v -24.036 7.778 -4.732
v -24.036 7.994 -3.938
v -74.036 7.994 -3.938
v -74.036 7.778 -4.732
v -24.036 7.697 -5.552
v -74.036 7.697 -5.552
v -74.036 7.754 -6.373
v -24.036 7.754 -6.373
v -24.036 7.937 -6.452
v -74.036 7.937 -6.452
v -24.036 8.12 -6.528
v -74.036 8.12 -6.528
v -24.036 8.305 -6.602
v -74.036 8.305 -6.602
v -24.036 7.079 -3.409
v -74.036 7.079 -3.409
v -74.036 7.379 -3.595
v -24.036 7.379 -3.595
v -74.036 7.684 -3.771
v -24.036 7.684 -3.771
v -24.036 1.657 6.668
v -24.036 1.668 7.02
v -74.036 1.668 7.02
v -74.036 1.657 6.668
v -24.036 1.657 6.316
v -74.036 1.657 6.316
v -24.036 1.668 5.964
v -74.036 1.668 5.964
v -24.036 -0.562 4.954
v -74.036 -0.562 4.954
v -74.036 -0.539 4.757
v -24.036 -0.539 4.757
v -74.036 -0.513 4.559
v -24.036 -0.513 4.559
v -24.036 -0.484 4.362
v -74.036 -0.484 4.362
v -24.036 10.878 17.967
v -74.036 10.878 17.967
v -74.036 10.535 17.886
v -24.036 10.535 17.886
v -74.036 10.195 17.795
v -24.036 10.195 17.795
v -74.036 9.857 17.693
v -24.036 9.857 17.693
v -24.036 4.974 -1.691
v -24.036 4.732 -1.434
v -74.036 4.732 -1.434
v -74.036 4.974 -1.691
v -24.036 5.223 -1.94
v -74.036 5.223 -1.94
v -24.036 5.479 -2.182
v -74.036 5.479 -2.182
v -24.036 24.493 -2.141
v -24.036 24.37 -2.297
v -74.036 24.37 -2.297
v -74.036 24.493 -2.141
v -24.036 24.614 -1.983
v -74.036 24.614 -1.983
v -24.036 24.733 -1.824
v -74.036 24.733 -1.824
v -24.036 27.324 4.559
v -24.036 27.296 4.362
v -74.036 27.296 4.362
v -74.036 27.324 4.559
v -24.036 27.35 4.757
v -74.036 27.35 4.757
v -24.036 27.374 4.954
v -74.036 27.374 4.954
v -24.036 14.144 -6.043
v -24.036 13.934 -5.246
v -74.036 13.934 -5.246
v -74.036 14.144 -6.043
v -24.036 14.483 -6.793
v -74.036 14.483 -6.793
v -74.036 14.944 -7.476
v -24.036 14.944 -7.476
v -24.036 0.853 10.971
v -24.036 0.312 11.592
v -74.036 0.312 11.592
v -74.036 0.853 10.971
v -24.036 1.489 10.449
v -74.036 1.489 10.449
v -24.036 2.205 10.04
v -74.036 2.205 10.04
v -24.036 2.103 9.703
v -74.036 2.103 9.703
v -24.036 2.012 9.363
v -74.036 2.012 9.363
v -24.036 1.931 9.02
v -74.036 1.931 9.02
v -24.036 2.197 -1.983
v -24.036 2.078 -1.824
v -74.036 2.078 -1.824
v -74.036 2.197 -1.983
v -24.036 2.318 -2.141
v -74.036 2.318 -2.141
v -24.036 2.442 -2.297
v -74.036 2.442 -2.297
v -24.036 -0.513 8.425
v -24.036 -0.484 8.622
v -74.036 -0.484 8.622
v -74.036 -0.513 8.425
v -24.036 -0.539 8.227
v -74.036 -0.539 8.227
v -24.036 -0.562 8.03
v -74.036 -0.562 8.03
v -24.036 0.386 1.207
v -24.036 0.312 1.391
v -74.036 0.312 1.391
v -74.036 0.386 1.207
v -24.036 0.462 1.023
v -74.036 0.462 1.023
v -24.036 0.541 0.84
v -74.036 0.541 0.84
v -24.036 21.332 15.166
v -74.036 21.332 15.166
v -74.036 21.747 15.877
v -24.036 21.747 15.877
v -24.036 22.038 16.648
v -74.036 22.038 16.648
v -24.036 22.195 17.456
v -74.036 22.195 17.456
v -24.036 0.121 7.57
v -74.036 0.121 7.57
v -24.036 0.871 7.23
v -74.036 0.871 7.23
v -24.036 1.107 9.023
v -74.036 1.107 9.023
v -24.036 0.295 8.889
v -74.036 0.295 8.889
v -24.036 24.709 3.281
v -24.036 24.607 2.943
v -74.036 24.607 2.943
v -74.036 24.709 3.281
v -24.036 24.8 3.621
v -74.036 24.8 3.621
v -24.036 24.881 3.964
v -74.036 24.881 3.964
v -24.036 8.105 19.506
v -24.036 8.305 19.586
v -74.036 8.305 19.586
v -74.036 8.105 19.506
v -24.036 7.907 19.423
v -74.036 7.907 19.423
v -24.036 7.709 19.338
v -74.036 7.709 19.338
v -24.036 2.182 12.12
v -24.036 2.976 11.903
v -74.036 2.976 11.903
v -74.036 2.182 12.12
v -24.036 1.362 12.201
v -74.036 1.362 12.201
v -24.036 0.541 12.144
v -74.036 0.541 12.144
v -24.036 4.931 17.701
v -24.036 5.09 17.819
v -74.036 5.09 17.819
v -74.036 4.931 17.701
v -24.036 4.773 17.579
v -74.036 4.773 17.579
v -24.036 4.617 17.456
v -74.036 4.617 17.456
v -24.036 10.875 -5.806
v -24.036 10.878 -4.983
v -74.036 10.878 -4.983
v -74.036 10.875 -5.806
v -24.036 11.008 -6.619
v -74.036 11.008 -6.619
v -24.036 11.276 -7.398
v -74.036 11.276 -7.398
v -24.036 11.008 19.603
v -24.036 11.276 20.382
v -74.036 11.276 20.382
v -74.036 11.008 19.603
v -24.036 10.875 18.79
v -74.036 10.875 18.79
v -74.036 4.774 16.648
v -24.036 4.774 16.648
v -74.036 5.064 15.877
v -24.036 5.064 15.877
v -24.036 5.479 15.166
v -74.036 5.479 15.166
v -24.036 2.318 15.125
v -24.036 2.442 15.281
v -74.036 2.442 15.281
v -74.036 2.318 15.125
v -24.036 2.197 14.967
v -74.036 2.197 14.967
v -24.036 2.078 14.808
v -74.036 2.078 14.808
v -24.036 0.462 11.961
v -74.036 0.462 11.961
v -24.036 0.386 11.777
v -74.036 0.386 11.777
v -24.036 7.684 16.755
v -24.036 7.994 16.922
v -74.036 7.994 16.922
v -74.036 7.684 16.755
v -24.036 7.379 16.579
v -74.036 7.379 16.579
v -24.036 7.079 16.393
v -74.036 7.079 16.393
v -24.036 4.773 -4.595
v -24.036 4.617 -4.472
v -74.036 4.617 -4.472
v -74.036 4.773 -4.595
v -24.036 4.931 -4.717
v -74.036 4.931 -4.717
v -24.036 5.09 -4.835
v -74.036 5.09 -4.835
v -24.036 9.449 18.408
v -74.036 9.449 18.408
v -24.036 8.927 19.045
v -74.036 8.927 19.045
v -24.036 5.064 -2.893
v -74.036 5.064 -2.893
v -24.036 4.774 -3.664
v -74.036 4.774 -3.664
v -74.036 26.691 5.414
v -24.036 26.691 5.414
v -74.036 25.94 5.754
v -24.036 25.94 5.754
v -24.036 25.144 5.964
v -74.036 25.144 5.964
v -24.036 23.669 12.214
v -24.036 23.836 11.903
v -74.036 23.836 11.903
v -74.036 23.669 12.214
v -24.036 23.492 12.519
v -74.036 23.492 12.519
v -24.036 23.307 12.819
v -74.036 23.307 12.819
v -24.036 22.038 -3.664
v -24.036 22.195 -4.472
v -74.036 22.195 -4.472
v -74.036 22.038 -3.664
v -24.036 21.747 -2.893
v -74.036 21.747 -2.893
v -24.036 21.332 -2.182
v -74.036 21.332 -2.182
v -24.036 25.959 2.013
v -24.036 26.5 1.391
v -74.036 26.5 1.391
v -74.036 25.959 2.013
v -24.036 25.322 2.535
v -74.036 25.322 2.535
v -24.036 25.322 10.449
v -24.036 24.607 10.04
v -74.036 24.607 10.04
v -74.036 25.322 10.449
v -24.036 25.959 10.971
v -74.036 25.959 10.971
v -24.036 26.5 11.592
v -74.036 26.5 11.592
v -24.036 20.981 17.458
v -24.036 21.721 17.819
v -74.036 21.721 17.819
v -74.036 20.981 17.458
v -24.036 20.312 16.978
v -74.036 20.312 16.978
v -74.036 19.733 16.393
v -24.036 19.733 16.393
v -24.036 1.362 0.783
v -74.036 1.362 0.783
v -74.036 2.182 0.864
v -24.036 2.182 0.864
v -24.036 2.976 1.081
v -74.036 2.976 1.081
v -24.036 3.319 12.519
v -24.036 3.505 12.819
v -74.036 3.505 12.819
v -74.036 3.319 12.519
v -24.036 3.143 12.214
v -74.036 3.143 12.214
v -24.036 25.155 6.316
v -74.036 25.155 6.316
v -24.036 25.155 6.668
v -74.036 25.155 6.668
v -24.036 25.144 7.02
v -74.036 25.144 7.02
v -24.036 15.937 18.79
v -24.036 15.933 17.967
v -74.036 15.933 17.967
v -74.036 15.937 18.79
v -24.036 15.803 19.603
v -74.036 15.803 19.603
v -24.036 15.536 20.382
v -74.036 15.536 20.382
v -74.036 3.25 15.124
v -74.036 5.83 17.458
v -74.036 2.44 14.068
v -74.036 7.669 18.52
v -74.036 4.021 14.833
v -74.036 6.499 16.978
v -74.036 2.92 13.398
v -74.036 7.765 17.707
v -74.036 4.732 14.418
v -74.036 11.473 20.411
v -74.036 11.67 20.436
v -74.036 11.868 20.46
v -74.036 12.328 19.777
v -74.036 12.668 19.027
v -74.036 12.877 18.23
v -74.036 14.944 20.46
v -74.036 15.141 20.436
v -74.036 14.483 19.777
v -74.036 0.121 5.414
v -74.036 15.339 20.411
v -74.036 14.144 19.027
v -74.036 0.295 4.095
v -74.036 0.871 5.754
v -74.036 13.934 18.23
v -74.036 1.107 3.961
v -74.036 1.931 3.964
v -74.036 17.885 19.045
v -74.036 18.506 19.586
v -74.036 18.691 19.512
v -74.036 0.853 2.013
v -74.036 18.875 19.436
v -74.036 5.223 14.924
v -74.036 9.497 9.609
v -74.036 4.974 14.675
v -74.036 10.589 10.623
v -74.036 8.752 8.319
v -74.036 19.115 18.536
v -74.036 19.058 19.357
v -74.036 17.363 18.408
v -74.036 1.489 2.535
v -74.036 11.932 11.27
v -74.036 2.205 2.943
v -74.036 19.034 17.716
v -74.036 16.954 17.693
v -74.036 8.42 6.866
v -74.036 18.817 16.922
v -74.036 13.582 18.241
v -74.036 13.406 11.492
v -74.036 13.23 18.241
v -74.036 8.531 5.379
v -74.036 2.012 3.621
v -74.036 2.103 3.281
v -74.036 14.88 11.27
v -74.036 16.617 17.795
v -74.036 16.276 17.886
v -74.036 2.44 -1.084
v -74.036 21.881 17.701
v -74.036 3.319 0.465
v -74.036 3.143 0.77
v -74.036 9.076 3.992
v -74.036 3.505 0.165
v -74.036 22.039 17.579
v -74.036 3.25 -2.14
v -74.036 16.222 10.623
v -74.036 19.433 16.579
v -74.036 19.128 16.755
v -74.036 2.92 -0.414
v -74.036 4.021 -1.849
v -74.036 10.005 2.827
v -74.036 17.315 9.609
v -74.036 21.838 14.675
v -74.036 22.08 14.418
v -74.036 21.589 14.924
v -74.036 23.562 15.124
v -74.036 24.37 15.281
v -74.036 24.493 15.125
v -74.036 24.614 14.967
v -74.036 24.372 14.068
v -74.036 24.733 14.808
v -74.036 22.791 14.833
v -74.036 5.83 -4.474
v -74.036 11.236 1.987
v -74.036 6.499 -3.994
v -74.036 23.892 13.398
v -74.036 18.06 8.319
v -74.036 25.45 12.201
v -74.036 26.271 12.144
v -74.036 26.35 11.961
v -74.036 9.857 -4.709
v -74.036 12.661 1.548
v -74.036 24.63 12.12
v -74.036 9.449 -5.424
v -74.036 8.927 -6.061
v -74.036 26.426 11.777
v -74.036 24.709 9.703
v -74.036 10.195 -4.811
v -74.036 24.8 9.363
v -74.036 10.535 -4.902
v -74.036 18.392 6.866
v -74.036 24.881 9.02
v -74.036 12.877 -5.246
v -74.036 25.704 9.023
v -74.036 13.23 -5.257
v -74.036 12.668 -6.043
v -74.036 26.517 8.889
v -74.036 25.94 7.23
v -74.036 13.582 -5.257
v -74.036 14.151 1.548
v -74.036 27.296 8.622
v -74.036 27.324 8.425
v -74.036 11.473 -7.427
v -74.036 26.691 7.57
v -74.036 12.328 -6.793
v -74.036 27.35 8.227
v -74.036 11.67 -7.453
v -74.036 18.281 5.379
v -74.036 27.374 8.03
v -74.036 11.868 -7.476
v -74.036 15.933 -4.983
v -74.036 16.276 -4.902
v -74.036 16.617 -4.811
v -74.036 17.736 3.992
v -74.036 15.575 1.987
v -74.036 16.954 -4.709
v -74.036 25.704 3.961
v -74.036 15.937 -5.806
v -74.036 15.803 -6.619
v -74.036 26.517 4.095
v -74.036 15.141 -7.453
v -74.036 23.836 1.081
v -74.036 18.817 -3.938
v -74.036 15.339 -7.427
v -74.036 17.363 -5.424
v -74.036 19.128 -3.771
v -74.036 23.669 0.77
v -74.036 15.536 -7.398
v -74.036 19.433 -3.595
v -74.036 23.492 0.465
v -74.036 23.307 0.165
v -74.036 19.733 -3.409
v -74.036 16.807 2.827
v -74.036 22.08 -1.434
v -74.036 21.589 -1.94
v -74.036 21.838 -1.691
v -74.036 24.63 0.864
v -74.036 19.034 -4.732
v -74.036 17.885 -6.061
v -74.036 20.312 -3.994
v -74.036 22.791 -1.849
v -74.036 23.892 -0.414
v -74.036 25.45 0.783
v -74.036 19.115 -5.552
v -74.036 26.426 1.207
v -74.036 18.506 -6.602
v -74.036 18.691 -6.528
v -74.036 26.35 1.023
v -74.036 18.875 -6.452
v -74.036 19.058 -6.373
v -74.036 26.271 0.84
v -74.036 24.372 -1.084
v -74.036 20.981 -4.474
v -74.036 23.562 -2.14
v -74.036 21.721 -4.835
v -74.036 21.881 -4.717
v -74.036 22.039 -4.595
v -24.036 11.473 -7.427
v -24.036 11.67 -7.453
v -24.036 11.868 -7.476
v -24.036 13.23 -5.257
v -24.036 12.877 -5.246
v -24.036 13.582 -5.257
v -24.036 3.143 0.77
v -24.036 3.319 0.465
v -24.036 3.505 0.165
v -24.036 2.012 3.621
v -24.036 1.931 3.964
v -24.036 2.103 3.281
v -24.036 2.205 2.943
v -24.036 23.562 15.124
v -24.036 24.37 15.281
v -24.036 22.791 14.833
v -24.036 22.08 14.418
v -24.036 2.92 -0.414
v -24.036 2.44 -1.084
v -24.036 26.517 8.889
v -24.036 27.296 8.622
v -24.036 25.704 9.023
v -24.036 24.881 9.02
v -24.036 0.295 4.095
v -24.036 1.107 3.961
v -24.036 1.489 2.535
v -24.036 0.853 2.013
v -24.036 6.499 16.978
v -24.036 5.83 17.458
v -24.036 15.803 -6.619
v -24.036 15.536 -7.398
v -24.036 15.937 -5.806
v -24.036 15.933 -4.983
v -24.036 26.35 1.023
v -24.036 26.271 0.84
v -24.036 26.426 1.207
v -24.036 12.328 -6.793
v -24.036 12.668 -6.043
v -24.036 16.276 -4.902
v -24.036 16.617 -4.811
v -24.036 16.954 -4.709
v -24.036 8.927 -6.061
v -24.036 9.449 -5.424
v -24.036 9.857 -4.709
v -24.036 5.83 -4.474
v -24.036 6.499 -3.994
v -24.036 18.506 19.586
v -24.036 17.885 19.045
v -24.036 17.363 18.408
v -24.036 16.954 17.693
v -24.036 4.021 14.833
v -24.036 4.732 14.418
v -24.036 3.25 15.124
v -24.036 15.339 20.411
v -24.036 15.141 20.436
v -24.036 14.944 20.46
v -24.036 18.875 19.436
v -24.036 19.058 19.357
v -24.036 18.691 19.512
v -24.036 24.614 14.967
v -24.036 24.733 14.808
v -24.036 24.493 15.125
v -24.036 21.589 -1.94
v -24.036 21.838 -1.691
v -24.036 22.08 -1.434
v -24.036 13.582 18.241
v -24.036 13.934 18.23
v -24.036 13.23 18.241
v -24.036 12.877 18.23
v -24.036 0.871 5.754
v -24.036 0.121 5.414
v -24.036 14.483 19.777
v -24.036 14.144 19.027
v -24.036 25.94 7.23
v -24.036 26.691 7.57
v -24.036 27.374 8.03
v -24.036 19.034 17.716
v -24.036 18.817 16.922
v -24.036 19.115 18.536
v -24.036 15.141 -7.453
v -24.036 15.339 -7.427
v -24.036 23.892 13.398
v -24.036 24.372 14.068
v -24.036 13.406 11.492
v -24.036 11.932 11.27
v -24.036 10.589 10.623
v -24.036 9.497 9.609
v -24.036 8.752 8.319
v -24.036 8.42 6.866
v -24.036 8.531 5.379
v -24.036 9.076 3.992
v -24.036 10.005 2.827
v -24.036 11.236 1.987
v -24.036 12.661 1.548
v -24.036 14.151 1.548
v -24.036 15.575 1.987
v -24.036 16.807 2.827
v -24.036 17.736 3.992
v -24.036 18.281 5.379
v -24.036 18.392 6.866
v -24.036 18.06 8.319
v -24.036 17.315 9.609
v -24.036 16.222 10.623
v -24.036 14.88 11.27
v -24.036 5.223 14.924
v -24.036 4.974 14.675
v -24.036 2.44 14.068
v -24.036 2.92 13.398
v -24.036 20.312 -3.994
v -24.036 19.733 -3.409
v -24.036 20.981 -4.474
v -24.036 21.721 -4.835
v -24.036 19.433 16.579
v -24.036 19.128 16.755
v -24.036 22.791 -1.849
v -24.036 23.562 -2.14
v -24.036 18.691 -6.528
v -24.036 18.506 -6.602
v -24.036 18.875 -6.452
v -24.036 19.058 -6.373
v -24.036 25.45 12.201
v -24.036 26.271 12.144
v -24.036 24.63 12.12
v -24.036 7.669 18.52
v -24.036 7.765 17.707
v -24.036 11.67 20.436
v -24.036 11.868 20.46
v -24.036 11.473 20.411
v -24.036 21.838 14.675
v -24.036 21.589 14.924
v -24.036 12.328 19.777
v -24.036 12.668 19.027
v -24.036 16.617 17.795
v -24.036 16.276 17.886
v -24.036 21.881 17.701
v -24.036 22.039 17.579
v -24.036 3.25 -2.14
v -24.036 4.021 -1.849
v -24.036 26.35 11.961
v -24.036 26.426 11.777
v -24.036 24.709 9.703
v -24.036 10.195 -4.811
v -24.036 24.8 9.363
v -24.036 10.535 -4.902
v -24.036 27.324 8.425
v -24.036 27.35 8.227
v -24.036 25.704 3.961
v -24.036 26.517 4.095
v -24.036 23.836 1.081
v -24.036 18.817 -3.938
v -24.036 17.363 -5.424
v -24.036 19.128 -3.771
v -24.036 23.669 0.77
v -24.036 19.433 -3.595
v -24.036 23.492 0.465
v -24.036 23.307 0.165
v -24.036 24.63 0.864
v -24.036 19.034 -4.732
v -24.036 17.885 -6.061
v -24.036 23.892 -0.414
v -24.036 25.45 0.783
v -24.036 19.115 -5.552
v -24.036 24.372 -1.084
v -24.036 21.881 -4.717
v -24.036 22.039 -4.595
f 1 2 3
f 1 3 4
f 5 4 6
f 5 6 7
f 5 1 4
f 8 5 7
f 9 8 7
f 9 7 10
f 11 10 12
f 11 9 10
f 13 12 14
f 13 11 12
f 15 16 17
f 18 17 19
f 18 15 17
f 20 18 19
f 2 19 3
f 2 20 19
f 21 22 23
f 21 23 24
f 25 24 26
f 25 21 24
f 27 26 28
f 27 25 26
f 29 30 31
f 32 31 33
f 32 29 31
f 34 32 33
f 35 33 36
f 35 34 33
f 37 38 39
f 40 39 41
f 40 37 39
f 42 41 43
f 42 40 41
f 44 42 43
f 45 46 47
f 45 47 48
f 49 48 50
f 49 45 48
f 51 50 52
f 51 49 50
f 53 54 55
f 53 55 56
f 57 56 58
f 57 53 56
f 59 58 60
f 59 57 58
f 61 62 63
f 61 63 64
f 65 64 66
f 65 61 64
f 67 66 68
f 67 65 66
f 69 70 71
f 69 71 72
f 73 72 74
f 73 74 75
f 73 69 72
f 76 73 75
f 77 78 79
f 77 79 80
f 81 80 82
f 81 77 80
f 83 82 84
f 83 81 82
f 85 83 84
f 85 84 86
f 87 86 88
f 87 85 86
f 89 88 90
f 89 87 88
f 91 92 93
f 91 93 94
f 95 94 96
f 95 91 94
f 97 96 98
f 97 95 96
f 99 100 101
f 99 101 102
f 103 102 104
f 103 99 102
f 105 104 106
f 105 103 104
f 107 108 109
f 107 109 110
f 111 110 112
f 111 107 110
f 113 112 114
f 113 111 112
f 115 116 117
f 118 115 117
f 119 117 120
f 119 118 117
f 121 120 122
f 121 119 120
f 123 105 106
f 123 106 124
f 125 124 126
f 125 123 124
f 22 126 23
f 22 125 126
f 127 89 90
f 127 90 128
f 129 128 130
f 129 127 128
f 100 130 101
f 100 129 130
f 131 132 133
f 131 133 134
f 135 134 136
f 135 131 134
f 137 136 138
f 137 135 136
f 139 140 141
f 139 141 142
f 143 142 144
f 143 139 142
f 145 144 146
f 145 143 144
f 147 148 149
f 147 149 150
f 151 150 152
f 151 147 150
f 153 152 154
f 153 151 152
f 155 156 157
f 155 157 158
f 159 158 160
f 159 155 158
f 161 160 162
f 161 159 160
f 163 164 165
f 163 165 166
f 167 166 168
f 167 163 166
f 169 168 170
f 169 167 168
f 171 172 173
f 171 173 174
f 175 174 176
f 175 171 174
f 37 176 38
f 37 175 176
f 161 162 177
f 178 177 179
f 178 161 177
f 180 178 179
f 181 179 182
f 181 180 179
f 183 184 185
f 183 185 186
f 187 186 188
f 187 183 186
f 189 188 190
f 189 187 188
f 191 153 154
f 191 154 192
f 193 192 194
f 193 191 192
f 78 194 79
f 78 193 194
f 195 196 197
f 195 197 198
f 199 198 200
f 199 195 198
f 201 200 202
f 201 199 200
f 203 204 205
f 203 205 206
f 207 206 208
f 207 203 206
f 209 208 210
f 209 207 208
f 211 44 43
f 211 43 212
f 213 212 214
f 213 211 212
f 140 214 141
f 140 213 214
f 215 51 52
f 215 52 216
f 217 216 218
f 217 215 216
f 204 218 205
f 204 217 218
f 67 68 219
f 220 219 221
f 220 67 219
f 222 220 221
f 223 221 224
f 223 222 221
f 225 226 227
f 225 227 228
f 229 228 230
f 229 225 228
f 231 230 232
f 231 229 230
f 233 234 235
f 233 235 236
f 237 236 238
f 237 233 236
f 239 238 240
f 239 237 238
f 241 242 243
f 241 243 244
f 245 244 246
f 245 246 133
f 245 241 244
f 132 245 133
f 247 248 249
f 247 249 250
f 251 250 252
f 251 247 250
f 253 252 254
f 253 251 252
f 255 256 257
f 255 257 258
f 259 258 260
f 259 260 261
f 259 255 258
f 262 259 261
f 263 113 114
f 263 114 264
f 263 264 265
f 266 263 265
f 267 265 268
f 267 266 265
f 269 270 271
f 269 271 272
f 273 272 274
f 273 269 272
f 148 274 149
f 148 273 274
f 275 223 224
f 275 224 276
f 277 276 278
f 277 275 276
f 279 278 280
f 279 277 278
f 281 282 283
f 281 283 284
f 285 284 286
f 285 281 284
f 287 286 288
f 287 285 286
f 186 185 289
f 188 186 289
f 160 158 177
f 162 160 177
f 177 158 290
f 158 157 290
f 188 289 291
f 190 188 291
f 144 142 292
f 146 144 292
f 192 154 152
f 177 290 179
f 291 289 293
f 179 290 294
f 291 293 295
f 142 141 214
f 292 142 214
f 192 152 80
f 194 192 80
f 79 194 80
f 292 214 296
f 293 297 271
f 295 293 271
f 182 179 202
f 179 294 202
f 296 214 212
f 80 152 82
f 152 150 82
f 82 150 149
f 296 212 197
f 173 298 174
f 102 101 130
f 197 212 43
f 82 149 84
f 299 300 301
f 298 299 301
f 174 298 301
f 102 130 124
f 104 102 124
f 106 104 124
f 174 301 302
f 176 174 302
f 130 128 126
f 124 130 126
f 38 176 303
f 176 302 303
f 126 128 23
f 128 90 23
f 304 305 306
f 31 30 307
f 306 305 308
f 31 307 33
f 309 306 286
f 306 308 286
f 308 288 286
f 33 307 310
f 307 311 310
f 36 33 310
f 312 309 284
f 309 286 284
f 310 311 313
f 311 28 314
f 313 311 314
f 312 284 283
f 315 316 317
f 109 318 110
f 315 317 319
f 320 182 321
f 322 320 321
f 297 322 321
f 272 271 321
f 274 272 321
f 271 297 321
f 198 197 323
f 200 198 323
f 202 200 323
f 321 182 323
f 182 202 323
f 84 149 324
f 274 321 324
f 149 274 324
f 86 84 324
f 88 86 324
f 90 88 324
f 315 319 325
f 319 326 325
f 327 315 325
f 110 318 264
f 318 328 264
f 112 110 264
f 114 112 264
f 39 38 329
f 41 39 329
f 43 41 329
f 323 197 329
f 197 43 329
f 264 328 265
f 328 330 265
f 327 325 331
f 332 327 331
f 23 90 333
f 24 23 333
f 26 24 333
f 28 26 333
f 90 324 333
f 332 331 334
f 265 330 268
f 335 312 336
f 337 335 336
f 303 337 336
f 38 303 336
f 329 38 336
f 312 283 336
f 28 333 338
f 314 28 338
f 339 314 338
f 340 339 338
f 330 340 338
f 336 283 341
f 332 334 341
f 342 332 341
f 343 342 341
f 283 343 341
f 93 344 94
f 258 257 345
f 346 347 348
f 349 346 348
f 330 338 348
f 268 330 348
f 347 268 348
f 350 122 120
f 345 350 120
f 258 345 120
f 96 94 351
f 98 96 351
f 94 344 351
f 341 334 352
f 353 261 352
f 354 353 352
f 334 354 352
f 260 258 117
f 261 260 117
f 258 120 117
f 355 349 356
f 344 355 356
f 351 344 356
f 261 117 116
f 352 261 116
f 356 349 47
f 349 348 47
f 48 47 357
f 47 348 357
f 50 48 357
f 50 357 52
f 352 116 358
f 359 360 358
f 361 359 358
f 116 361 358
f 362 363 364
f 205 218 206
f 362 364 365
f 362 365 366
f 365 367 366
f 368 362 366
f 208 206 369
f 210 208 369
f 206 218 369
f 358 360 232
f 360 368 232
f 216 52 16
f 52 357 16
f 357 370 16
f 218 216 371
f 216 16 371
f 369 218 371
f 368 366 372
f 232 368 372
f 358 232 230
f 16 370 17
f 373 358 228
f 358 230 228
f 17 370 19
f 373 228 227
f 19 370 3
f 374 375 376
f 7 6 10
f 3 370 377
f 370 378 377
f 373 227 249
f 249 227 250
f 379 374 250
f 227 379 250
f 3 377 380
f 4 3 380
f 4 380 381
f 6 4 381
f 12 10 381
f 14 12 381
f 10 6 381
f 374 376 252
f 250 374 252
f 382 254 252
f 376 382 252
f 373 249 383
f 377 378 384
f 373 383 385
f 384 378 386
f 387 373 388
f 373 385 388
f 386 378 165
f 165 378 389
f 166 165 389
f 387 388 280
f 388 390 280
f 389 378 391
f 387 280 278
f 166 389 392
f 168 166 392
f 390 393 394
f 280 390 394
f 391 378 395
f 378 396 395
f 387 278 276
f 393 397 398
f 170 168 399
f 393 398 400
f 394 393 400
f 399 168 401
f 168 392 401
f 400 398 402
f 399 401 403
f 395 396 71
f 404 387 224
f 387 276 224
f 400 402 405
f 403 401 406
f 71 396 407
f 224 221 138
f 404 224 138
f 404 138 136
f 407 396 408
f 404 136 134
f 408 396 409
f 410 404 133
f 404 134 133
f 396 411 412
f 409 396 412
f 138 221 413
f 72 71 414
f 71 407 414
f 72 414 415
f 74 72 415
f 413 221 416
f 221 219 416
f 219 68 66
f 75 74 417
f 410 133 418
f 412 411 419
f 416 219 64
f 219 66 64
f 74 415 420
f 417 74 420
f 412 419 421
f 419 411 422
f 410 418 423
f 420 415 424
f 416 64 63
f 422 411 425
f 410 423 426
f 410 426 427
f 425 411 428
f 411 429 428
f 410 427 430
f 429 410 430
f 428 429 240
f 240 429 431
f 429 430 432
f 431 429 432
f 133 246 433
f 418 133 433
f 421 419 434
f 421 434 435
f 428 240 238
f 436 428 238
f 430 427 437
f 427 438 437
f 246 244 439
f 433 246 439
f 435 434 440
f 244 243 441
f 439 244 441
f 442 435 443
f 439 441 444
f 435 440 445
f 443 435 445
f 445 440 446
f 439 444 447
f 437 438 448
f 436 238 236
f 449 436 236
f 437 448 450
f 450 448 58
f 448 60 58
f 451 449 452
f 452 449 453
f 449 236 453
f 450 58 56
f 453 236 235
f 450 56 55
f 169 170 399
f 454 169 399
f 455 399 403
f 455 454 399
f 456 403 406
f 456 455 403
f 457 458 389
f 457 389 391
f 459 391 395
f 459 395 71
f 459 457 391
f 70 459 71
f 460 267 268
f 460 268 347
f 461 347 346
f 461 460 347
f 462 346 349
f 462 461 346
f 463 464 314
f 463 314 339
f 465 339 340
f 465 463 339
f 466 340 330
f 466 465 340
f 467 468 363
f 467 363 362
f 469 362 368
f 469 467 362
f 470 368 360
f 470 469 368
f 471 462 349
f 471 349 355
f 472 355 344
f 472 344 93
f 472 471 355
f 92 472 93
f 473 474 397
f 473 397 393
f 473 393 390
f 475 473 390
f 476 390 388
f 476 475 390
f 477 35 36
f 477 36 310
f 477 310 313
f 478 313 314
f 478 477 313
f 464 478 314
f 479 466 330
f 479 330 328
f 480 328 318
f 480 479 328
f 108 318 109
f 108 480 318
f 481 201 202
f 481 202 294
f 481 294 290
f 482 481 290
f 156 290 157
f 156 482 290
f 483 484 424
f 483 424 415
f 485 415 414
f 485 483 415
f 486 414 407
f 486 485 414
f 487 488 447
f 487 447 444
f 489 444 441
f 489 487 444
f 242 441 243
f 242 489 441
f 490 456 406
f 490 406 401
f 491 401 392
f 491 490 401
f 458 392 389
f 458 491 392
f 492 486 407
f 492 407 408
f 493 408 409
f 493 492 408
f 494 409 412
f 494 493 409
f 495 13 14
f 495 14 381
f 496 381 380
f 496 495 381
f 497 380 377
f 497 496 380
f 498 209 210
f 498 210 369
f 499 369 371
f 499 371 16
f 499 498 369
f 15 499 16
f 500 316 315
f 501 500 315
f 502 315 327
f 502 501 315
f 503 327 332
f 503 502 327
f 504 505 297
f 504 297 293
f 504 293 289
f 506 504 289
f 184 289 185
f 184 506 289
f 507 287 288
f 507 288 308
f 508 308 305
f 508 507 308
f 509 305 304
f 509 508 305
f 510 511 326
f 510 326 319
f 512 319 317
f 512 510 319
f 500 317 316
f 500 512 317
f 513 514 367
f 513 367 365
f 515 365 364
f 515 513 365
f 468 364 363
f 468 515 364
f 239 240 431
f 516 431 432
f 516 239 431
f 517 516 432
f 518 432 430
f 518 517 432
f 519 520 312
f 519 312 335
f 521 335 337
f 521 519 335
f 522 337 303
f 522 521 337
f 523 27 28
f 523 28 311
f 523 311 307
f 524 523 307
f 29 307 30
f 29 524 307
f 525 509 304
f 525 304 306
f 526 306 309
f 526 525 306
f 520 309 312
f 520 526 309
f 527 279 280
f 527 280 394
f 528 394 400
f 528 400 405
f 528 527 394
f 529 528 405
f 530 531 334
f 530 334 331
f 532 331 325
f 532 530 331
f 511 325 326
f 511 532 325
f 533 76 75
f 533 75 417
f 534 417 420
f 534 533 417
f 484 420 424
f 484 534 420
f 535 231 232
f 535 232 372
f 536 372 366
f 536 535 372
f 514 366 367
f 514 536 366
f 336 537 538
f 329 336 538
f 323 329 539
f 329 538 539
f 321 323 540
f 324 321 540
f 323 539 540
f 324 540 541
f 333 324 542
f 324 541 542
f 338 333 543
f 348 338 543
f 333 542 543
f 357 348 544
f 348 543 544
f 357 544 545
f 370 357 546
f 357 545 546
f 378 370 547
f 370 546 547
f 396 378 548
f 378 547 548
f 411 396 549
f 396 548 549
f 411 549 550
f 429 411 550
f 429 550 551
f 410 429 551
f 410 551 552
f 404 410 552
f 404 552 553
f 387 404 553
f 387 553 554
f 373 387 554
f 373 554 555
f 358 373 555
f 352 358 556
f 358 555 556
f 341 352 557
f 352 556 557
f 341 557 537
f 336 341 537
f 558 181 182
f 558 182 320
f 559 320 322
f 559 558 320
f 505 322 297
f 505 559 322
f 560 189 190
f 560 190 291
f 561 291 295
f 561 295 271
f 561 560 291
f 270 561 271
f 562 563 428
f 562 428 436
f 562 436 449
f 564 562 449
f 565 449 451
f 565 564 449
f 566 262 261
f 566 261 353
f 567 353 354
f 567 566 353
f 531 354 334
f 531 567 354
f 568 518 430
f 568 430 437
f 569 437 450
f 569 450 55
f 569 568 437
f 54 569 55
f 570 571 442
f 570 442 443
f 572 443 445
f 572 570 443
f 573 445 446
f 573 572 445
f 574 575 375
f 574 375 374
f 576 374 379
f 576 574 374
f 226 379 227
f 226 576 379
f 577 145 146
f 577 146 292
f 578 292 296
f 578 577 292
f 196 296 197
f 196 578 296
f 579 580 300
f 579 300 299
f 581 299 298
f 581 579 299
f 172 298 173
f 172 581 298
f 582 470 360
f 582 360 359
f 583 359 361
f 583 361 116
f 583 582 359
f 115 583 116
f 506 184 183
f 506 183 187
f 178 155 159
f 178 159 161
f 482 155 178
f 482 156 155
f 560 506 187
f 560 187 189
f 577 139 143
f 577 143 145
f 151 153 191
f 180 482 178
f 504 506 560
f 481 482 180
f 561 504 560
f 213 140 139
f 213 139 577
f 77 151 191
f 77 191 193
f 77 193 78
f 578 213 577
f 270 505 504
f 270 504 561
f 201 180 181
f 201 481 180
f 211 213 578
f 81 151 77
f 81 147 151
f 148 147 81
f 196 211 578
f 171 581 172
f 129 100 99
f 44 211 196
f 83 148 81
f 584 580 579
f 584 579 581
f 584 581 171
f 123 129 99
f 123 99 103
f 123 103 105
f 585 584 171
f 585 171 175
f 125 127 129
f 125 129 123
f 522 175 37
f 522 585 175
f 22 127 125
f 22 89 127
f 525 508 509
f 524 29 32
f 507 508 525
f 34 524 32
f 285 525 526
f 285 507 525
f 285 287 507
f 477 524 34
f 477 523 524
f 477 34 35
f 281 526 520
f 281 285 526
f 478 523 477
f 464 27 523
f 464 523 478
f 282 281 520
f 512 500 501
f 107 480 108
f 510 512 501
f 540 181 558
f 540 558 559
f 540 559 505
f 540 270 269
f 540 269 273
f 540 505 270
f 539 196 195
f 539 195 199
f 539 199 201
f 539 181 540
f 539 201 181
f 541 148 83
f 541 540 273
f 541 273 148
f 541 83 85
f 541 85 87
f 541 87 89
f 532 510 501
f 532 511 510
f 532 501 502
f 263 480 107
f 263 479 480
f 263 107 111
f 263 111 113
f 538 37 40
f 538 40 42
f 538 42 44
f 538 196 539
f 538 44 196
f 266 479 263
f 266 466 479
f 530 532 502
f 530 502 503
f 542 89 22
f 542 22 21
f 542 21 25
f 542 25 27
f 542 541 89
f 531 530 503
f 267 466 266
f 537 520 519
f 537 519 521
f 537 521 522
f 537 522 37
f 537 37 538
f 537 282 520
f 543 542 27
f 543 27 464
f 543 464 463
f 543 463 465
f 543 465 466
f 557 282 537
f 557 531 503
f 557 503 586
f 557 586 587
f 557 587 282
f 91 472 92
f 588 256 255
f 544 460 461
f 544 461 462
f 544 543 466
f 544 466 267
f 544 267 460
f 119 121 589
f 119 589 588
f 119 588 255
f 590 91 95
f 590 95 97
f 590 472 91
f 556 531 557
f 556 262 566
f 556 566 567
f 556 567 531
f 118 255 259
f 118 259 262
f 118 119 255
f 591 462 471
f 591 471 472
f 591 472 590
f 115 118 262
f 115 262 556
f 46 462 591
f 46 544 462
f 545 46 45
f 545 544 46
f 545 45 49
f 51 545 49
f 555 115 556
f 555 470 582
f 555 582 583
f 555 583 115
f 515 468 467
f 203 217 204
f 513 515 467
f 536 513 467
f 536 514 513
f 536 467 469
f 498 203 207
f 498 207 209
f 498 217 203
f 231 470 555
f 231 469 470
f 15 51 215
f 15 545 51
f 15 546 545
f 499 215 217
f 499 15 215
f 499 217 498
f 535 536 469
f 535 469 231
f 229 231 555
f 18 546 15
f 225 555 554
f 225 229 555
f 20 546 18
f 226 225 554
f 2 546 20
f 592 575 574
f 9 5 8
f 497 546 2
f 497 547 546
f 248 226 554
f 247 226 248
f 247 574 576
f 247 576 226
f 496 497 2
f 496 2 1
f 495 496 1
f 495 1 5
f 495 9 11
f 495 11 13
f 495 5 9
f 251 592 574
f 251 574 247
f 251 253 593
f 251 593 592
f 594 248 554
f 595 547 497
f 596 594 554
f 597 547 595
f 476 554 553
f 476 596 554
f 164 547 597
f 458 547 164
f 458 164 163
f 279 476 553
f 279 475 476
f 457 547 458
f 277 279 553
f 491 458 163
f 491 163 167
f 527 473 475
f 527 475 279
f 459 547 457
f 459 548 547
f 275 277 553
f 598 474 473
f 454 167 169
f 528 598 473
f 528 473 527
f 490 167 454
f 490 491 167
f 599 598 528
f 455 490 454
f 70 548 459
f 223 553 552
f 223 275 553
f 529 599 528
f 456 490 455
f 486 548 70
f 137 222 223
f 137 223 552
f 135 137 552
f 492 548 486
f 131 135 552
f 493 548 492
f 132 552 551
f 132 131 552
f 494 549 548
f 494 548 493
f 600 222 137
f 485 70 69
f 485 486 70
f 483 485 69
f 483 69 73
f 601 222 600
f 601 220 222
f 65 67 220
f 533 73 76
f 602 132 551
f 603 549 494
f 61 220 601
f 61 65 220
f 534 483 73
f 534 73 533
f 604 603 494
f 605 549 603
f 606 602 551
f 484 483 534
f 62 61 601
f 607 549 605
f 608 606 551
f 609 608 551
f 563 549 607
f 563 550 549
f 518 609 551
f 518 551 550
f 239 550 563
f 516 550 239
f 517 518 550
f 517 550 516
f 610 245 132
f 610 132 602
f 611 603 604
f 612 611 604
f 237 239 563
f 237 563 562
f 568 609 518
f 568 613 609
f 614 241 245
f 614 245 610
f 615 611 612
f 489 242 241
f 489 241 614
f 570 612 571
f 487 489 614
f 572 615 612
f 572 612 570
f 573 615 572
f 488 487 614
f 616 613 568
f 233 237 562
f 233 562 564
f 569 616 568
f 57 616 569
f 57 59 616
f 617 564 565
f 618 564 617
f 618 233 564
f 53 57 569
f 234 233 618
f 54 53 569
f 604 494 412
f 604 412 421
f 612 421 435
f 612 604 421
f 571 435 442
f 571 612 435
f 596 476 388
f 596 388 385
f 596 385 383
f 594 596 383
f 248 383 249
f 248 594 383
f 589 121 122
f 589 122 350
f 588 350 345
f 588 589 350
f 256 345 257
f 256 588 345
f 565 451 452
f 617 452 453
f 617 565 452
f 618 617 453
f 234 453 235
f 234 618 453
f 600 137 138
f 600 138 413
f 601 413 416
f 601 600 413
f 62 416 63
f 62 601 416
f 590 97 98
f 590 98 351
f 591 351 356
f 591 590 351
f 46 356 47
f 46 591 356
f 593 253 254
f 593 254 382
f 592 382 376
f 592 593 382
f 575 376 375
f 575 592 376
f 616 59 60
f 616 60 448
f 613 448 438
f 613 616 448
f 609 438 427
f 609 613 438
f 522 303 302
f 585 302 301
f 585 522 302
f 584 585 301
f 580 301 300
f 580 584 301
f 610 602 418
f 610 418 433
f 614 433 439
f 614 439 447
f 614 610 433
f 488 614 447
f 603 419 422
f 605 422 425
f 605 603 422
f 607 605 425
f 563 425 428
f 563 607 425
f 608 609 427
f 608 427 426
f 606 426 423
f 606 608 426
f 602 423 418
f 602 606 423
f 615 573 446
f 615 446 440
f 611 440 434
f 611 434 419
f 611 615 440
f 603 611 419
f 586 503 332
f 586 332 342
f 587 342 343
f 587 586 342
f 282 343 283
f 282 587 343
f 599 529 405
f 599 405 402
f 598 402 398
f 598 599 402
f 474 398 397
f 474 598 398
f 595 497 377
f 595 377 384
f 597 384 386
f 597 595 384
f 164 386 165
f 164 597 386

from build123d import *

# Parameters (mm, degrees)
SKETCH1_R           = 5
BOSS_EXTRUDE1_DEPTH = 50


with BuildPart() as part:
    # Sketch1 → Boss-Extrude1 (new body)
    with BuildSketch(Plane(origin=(-24.036200878, 0, 0), x_dir=(0, 0, -1), z_dir=(1, 0, 0))):
        with BuildLine():
            ThreePointArc((-20.45966069, 14.943685115), (-19.408744482, 14.297932757), (-18.23009109, 13.93434348))
            ThreePointArc((-18.23009109, 13.93434348), (-18.241981361, 13.405873993), (-18.23009109, 12.877404505))
            ThreePointArc((-18.23009109, 12.877404505), (-19.408744482, 12.513815228), (-20.45966069, 11.86806287))
            ThreePointArc((-20.45966069, 11.86806287), (-20.423843041, 11.571709606), (-20.381738364, 11.276184046))
            ThreePointArc((-20.381738364, 11.276184046), (-19.19949825, 10.924432295), (-17.966902668, 10.878289967))
            ThreePointArc((-17.966902668, 10.878289967), (-17.84160982, 10.364750213), (-17.693346732, 9.857365315))
            ThreePointArc((-17.693346732, 9.857365315), (-18.737734654, 9.201107096), (-19.585708752, 8.305361087))
            ThreePointArc((-19.585708752, 8.305361087), (-19.465117023, 8.00599622), (-19.337681897, 7.709479816))
            ThreePointArc((-19.337681897, 7.709479816), (-18.111776725, 7.700053845), (-16.921717322, 7.994487129))
            ThreePointArc((-16.921717322, 7.994487129), (-16.667779856, 7.530873993), (-16.393247835, 7.079151127))
            ThreePointArc((-16.393247835, 7.079151127), (-17.232196976, 6.17494688), (-17.81944093, 5.09025083))
            ThreePointArc((-17.81944093, 5.09025083), (-17.640245305, 4.851510199), (-17.456018805, 4.616629895))
            ThreePointArc((-17.456018805, 4.616629895), (-16.256292957, 4.903124001), (-15.165762707, 5.479461363))
            ThreePointArc((-15.165762707, 5.479461363), (-14.80048604, 5.097369314), (-14.418393991, 4.732092647))
            ThreePointArc((-14.418393991, 4.732092647), (-14.994731353, 3.641562397), (-15.281225459, 2.441836549))
            ThreePointArc((-15.281225459, 2.441836549), (-15.046345155, 2.257610049), (-14.807604524, 2.078414424))
            ThreePointArc((-14.807604524, 2.078414424), (-13.722908474, 2.665658378), (-12.818704227, 3.504607519))
            ThreePointArc((-12.818704227, 3.504607519), (-12.366981361, 3.230075498), (-11.903368225, 2.976138032))
            ThreePointArc((-11.903368225, 2.976138032), (-12.17781737, 1.773599613), (-12.144037527, 0.540603301))
            ThreePointArc((-12.144037527, 0.540603301), (-11.869479248, 0.423445663), (-11.592494266, 0.312146602))
            ThreePointArc((-11.592494266, 0.312146602), (-10.696748258, 1.1601207), (-10.040490039, 2.204508622))
            ThreePointArc((-10.040490039, 2.204508622), (-9.533105141, 2.056245534), (-9.019565387, 1.930952686))
            ThreePointArc((-9.019565387, 1.930952686), (-8.973423058, 0.698357104), (-8.621671308, -0.48388301))
            ThreePointArc((-8.621671308, -0.48388301), (-8.326145748, -0.525987687), (-8.029792484, -0.561805336))
            ThreePointArc((-8.029792484, -0.561805336), (-7.384040126, 0.489110872), (-7.020450848, 1.667764264))
            ThreePointArc((-7.020450848, 1.667764264), (-6.491981361, 1.655873993), (-5.963511874, 1.667764264))
            ThreePointArc((-5.963511874, 1.667764264), (-5.599922596, 0.489110872), (-4.954170239, -0.561805336))
            ThreePointArc((-4.954170239, -0.561805336), (-4.657816975, -0.525987687), (-4.362291414, -0.48388301))
            ThreePointArc((-4.362291414, -0.48388301), (-4.010539664, 0.698357104), (-3.964397336, 1.930952686))
            ThreePointArc((-3.964397336, 1.930952686), (-3.450857581, 2.056245534), (-2.943472684, 2.204508622))
            ThreePointArc((-2.943472684, 2.204508622), (-2.287214465, 1.1601207), (-1.391468456, 0.312146602))
            ThreePointArc((-1.391468456, 0.312146602), (-1.114483475, 0.423445663), (-0.839925195, 0.540603301))
            ThreePointArc((-0.839925195, 0.540603301), (-0.806145353, 1.773599613), (-1.080594498, 2.976138032))
            ThreePointArc((-1.080594498, 2.976138032), (-0.616981361, 3.230075498), (-0.165258496, 3.504607519))
            ThreePointArc((-0.165258496, 3.504607519), (0.738945751, 2.665658378), (1.823641801, 2.078414424))
            ThreePointArc((1.823641801, 2.078414424), (2.062382432, 2.257610049), (2.297262736, 2.441836549))
            ThreePointArc((2.297262736, 2.441836549), (2.01076863, 3.641562397), (1.434431268, 4.732092647))
            ThreePointArc((1.434431268, 4.732092647), (1.816523318, 5.097369314), (2.181799984, 5.479461363))
            ThreePointArc((2.181799984, 5.479461363), (3.272330234, 4.903124001), (4.472056082, 4.616629895))
            ThreePointArc((4.472056082, 4.616629895), (4.656282582, 4.851510199), (4.835478208, 5.09025083))
            ThreePointArc((4.835478208, 5.09025083), (4.248234253, 6.17494688), (3.409285113, 7.079151127))
            ThreePointArc((3.409285113, 7.079151127), (3.683817133, 7.530873993), (3.9377546, 7.994487129))
            ThreePointArc((3.9377546, 7.994487129), (5.140293018, 7.720037984), (6.37328933, 7.753817827))
            ThreePointArc((6.37328933, 7.753817827), (6.490446969, 8.028376106), (6.601746029, 8.305361087))
            ThreePointArc((6.601746029, 8.305361087), (5.753771931, 9.201107096), (4.709384009, 9.857365315))
            ThreePointArc((4.709384009, 9.857365315), (4.857647098, 10.364750213), (4.982939945, 10.878289967))
            ThreePointArc((4.982939945, 10.878289967), (6.215535527, 10.924432295), (7.397775641, 11.276184046))
            ThreePointArc((7.397775641, 11.276184046), (7.439880319, 11.571709606), (7.475697967, 11.86806287))
            ThreePointArc((7.475697967, 11.86806287), (6.424781759, 12.513815228), (5.246128367, 12.877404505))
            ThreePointArc((5.246128367, 12.877404505), (5.258018639, 13.405873993), (5.246128367, 13.93434348))
            ThreePointArc((5.246128367, 13.93434348), (6.424781759, 14.297932757), (7.475697967, 14.943685115))
            ThreePointArc((7.475697967, 14.943685115), (7.439880319, 15.240038379), (7.397775641, 15.535563939))
            ThreePointArc((7.397775641, 15.535563939), (6.215535527, 15.88731569), (4.982939945, 15.933458018))
            ThreePointArc((4.982939945, 15.933458018), (4.857647098, 16.446997772), (4.709384009, 16.95438267))
            ThreePointArc((4.709384009, 16.95438267), (5.753771931, 17.610640889), (6.601746029, 18.506386898))
            ThreePointArc((6.601746029, 18.506386898), (6.490446969, 18.783371879), (6.37328933, 19.057930158))
            ThreePointArc((6.37328933, 19.057930158), (5.140293018, 19.091710001), (3.9377546, 18.817260856))
            ThreePointArc((3.9377546, 18.817260856), (3.683817133, 19.280873993), (3.409285113, 19.732596858))
            ThreePointArc((3.409285113, 19.732596858), (4.248234253, 20.636801105), (4.835478208, 21.721497155))
            ThreePointArc((4.835478208, 21.721497155), (4.656282582, 21.960237786), (4.472056082, 22.19511809))
            ThreePointArc((4.472056082, 22.19511809), (3.272330234, 21.908623984), (2.181799984, 21.332286622))
            ThreePointArc((2.181799984, 21.332286622), (1.816523318, 21.714378671), (1.434431268, 22.079655338))
            ThreePointArc((1.434431268, 22.079655338), (2.01076863, 23.170185588), (2.297262736, 24.369911436))
            ThreePointArc((2.297262736, 24.369911436), (2.062382432, 24.554137936), (1.823641801, 24.733333561))
            ThreePointArc((1.823641801, 24.733333561), (0.738945751, 24.146089607), (-0.165258496, 23.307140466))
            ThreePointArc((-0.165258496, 23.307140466), (-0.616981361, 23.581672487), (-1.080594498, 23.835609953))
            ThreePointArc((-1.080594498, 23.835609953), (-0.806145353, 25.038148372), (-0.839925195, 26.271144684))
            ThreePointArc((-0.839925195, 26.271144684), (-1.114483475, 26.388302322), (-1.391468456, 26.499601383))
            ThreePointArc((-1.391468456, 26.499601383), (-2.287214465, 25.651627285), (-2.943472684, 24.607239363))
            ThreePointArc((-2.943472684, 24.607239363), (-3.450857581, 24.755502451), (-3.964397336, 24.880795299))
            ThreePointArc((-3.964397336, 24.880795299), (-4.010539664, 26.113390881), (-4.362291414, 27.295630995))
            ThreePointArc((-4.362291414, 27.295630995), (-4.657816975, 27.337735672), (-4.954170239, 27.373553321))
            ThreePointArc((-4.954170239, 27.373553321), (-5.599922596, 26.322637113), (-5.963511874, 25.143983721))
            ThreePointArc((-5.963511874, 25.143983721), (-6.491981361, 25.155873993), (-7.020450848, 25.143983721))
            ThreePointArc((-7.020450848, 25.143983721), (-7.384040126, 26.322637113), (-8.029792484, 27.373553321))
            ThreePointArc((-8.029792484, 27.373553321), (-8.326145748, 27.337735672), (-8.621671308, 27.295630995))
            ThreePointArc((-8.621671308, 27.295630995), (-8.973423058, 26.113390881), (-9.019565387, 24.880795299))
            ThreePointArc((-9.019565387, 24.880795299), (-9.533105141, 24.755502451), (-10.040490039, 24.607239363))
            ThreePointArc((-10.040490039, 24.607239363), (-10.696748258, 25.651627285), (-11.592494266, 26.499601383))
            ThreePointArc((-11.592494266, 26.499601383), (-11.869479248, 26.388302322), (-12.144037527, 26.271144684))
            ThreePointArc((-12.144037527, 26.271144684), (-12.17781737, 25.038148372), (-11.903368225, 23.835609953))
            ThreePointArc((-11.903368225, 23.835609953), (-12.366981361, 23.581672487), (-12.818704227, 23.307140466))
            ThreePointArc((-12.818704227, 23.307140466), (-13.722908474, 24.146089607), (-14.807604524, 24.733333561))
            ThreePointArc((-14.807604524, 24.733333561), (-15.046345155, 24.554137936), (-15.281225459, 24.369911436))
            ThreePointArc((-15.281225459, 24.369911436), (-14.994731353, 23.170185588), (-14.418393991, 22.079655338))
            ThreePointArc((-14.418393991, 22.079655338), (-14.80048604, 21.714378671), (-15.165762707, 21.332286622))
            ThreePointArc((-15.165762707, 21.332286622), (-16.256292957, 21.908623984), (-17.456018805, 22.19511809))
            ThreePointArc((-17.456018805, 22.19511809), (-17.640245305, 21.960237786), (-17.81944093, 21.721497155))
            ThreePointArc((-17.81944093, 21.721497155), (-17.232196976, 20.636801105), (-16.393247835, 19.732596858))
            ThreePointArc((-16.393247835, 19.732596858), (-16.667779856, 19.280873993), (-16.921717322, 18.817260856))
            ThreePointArc((-16.921717322, 18.817260856), (-18.124255741, 19.091710001), (-19.357252053, 19.057930158))
            ThreePointArc((-19.357252053, 19.057930158), (-19.474409691, 18.783371879), (-19.585708752, 18.506386898))
            ThreePointArc((-19.585708752, 18.506386898), (-18.737734654, 17.610640889), (-17.693346732, 16.95438267))
            ThreePointArc((-17.693346732, 16.95438267), (-17.84160982, 16.446997772), (-17.966902668, 15.933458018))
            ThreePointArc((-17.966902668, 15.933458018), (-19.19949825, 15.88731569), (-20.381738364, 15.535563939))
            ThreePointArc((-20.381738364, 15.535563939), (-20.423843041, 15.240038379), (-20.45966069, 14.943685115))
        make_face()
        with Locations(Location((-6.491981361, 13.405873993, 0), (0, 0, 180))):
            Circle(SKETCH1_R, mode=Mode.SUBTRACT)
    extrude(amount=-BOSS_EXTRUDE1_DEPTH)


solid = part.part
